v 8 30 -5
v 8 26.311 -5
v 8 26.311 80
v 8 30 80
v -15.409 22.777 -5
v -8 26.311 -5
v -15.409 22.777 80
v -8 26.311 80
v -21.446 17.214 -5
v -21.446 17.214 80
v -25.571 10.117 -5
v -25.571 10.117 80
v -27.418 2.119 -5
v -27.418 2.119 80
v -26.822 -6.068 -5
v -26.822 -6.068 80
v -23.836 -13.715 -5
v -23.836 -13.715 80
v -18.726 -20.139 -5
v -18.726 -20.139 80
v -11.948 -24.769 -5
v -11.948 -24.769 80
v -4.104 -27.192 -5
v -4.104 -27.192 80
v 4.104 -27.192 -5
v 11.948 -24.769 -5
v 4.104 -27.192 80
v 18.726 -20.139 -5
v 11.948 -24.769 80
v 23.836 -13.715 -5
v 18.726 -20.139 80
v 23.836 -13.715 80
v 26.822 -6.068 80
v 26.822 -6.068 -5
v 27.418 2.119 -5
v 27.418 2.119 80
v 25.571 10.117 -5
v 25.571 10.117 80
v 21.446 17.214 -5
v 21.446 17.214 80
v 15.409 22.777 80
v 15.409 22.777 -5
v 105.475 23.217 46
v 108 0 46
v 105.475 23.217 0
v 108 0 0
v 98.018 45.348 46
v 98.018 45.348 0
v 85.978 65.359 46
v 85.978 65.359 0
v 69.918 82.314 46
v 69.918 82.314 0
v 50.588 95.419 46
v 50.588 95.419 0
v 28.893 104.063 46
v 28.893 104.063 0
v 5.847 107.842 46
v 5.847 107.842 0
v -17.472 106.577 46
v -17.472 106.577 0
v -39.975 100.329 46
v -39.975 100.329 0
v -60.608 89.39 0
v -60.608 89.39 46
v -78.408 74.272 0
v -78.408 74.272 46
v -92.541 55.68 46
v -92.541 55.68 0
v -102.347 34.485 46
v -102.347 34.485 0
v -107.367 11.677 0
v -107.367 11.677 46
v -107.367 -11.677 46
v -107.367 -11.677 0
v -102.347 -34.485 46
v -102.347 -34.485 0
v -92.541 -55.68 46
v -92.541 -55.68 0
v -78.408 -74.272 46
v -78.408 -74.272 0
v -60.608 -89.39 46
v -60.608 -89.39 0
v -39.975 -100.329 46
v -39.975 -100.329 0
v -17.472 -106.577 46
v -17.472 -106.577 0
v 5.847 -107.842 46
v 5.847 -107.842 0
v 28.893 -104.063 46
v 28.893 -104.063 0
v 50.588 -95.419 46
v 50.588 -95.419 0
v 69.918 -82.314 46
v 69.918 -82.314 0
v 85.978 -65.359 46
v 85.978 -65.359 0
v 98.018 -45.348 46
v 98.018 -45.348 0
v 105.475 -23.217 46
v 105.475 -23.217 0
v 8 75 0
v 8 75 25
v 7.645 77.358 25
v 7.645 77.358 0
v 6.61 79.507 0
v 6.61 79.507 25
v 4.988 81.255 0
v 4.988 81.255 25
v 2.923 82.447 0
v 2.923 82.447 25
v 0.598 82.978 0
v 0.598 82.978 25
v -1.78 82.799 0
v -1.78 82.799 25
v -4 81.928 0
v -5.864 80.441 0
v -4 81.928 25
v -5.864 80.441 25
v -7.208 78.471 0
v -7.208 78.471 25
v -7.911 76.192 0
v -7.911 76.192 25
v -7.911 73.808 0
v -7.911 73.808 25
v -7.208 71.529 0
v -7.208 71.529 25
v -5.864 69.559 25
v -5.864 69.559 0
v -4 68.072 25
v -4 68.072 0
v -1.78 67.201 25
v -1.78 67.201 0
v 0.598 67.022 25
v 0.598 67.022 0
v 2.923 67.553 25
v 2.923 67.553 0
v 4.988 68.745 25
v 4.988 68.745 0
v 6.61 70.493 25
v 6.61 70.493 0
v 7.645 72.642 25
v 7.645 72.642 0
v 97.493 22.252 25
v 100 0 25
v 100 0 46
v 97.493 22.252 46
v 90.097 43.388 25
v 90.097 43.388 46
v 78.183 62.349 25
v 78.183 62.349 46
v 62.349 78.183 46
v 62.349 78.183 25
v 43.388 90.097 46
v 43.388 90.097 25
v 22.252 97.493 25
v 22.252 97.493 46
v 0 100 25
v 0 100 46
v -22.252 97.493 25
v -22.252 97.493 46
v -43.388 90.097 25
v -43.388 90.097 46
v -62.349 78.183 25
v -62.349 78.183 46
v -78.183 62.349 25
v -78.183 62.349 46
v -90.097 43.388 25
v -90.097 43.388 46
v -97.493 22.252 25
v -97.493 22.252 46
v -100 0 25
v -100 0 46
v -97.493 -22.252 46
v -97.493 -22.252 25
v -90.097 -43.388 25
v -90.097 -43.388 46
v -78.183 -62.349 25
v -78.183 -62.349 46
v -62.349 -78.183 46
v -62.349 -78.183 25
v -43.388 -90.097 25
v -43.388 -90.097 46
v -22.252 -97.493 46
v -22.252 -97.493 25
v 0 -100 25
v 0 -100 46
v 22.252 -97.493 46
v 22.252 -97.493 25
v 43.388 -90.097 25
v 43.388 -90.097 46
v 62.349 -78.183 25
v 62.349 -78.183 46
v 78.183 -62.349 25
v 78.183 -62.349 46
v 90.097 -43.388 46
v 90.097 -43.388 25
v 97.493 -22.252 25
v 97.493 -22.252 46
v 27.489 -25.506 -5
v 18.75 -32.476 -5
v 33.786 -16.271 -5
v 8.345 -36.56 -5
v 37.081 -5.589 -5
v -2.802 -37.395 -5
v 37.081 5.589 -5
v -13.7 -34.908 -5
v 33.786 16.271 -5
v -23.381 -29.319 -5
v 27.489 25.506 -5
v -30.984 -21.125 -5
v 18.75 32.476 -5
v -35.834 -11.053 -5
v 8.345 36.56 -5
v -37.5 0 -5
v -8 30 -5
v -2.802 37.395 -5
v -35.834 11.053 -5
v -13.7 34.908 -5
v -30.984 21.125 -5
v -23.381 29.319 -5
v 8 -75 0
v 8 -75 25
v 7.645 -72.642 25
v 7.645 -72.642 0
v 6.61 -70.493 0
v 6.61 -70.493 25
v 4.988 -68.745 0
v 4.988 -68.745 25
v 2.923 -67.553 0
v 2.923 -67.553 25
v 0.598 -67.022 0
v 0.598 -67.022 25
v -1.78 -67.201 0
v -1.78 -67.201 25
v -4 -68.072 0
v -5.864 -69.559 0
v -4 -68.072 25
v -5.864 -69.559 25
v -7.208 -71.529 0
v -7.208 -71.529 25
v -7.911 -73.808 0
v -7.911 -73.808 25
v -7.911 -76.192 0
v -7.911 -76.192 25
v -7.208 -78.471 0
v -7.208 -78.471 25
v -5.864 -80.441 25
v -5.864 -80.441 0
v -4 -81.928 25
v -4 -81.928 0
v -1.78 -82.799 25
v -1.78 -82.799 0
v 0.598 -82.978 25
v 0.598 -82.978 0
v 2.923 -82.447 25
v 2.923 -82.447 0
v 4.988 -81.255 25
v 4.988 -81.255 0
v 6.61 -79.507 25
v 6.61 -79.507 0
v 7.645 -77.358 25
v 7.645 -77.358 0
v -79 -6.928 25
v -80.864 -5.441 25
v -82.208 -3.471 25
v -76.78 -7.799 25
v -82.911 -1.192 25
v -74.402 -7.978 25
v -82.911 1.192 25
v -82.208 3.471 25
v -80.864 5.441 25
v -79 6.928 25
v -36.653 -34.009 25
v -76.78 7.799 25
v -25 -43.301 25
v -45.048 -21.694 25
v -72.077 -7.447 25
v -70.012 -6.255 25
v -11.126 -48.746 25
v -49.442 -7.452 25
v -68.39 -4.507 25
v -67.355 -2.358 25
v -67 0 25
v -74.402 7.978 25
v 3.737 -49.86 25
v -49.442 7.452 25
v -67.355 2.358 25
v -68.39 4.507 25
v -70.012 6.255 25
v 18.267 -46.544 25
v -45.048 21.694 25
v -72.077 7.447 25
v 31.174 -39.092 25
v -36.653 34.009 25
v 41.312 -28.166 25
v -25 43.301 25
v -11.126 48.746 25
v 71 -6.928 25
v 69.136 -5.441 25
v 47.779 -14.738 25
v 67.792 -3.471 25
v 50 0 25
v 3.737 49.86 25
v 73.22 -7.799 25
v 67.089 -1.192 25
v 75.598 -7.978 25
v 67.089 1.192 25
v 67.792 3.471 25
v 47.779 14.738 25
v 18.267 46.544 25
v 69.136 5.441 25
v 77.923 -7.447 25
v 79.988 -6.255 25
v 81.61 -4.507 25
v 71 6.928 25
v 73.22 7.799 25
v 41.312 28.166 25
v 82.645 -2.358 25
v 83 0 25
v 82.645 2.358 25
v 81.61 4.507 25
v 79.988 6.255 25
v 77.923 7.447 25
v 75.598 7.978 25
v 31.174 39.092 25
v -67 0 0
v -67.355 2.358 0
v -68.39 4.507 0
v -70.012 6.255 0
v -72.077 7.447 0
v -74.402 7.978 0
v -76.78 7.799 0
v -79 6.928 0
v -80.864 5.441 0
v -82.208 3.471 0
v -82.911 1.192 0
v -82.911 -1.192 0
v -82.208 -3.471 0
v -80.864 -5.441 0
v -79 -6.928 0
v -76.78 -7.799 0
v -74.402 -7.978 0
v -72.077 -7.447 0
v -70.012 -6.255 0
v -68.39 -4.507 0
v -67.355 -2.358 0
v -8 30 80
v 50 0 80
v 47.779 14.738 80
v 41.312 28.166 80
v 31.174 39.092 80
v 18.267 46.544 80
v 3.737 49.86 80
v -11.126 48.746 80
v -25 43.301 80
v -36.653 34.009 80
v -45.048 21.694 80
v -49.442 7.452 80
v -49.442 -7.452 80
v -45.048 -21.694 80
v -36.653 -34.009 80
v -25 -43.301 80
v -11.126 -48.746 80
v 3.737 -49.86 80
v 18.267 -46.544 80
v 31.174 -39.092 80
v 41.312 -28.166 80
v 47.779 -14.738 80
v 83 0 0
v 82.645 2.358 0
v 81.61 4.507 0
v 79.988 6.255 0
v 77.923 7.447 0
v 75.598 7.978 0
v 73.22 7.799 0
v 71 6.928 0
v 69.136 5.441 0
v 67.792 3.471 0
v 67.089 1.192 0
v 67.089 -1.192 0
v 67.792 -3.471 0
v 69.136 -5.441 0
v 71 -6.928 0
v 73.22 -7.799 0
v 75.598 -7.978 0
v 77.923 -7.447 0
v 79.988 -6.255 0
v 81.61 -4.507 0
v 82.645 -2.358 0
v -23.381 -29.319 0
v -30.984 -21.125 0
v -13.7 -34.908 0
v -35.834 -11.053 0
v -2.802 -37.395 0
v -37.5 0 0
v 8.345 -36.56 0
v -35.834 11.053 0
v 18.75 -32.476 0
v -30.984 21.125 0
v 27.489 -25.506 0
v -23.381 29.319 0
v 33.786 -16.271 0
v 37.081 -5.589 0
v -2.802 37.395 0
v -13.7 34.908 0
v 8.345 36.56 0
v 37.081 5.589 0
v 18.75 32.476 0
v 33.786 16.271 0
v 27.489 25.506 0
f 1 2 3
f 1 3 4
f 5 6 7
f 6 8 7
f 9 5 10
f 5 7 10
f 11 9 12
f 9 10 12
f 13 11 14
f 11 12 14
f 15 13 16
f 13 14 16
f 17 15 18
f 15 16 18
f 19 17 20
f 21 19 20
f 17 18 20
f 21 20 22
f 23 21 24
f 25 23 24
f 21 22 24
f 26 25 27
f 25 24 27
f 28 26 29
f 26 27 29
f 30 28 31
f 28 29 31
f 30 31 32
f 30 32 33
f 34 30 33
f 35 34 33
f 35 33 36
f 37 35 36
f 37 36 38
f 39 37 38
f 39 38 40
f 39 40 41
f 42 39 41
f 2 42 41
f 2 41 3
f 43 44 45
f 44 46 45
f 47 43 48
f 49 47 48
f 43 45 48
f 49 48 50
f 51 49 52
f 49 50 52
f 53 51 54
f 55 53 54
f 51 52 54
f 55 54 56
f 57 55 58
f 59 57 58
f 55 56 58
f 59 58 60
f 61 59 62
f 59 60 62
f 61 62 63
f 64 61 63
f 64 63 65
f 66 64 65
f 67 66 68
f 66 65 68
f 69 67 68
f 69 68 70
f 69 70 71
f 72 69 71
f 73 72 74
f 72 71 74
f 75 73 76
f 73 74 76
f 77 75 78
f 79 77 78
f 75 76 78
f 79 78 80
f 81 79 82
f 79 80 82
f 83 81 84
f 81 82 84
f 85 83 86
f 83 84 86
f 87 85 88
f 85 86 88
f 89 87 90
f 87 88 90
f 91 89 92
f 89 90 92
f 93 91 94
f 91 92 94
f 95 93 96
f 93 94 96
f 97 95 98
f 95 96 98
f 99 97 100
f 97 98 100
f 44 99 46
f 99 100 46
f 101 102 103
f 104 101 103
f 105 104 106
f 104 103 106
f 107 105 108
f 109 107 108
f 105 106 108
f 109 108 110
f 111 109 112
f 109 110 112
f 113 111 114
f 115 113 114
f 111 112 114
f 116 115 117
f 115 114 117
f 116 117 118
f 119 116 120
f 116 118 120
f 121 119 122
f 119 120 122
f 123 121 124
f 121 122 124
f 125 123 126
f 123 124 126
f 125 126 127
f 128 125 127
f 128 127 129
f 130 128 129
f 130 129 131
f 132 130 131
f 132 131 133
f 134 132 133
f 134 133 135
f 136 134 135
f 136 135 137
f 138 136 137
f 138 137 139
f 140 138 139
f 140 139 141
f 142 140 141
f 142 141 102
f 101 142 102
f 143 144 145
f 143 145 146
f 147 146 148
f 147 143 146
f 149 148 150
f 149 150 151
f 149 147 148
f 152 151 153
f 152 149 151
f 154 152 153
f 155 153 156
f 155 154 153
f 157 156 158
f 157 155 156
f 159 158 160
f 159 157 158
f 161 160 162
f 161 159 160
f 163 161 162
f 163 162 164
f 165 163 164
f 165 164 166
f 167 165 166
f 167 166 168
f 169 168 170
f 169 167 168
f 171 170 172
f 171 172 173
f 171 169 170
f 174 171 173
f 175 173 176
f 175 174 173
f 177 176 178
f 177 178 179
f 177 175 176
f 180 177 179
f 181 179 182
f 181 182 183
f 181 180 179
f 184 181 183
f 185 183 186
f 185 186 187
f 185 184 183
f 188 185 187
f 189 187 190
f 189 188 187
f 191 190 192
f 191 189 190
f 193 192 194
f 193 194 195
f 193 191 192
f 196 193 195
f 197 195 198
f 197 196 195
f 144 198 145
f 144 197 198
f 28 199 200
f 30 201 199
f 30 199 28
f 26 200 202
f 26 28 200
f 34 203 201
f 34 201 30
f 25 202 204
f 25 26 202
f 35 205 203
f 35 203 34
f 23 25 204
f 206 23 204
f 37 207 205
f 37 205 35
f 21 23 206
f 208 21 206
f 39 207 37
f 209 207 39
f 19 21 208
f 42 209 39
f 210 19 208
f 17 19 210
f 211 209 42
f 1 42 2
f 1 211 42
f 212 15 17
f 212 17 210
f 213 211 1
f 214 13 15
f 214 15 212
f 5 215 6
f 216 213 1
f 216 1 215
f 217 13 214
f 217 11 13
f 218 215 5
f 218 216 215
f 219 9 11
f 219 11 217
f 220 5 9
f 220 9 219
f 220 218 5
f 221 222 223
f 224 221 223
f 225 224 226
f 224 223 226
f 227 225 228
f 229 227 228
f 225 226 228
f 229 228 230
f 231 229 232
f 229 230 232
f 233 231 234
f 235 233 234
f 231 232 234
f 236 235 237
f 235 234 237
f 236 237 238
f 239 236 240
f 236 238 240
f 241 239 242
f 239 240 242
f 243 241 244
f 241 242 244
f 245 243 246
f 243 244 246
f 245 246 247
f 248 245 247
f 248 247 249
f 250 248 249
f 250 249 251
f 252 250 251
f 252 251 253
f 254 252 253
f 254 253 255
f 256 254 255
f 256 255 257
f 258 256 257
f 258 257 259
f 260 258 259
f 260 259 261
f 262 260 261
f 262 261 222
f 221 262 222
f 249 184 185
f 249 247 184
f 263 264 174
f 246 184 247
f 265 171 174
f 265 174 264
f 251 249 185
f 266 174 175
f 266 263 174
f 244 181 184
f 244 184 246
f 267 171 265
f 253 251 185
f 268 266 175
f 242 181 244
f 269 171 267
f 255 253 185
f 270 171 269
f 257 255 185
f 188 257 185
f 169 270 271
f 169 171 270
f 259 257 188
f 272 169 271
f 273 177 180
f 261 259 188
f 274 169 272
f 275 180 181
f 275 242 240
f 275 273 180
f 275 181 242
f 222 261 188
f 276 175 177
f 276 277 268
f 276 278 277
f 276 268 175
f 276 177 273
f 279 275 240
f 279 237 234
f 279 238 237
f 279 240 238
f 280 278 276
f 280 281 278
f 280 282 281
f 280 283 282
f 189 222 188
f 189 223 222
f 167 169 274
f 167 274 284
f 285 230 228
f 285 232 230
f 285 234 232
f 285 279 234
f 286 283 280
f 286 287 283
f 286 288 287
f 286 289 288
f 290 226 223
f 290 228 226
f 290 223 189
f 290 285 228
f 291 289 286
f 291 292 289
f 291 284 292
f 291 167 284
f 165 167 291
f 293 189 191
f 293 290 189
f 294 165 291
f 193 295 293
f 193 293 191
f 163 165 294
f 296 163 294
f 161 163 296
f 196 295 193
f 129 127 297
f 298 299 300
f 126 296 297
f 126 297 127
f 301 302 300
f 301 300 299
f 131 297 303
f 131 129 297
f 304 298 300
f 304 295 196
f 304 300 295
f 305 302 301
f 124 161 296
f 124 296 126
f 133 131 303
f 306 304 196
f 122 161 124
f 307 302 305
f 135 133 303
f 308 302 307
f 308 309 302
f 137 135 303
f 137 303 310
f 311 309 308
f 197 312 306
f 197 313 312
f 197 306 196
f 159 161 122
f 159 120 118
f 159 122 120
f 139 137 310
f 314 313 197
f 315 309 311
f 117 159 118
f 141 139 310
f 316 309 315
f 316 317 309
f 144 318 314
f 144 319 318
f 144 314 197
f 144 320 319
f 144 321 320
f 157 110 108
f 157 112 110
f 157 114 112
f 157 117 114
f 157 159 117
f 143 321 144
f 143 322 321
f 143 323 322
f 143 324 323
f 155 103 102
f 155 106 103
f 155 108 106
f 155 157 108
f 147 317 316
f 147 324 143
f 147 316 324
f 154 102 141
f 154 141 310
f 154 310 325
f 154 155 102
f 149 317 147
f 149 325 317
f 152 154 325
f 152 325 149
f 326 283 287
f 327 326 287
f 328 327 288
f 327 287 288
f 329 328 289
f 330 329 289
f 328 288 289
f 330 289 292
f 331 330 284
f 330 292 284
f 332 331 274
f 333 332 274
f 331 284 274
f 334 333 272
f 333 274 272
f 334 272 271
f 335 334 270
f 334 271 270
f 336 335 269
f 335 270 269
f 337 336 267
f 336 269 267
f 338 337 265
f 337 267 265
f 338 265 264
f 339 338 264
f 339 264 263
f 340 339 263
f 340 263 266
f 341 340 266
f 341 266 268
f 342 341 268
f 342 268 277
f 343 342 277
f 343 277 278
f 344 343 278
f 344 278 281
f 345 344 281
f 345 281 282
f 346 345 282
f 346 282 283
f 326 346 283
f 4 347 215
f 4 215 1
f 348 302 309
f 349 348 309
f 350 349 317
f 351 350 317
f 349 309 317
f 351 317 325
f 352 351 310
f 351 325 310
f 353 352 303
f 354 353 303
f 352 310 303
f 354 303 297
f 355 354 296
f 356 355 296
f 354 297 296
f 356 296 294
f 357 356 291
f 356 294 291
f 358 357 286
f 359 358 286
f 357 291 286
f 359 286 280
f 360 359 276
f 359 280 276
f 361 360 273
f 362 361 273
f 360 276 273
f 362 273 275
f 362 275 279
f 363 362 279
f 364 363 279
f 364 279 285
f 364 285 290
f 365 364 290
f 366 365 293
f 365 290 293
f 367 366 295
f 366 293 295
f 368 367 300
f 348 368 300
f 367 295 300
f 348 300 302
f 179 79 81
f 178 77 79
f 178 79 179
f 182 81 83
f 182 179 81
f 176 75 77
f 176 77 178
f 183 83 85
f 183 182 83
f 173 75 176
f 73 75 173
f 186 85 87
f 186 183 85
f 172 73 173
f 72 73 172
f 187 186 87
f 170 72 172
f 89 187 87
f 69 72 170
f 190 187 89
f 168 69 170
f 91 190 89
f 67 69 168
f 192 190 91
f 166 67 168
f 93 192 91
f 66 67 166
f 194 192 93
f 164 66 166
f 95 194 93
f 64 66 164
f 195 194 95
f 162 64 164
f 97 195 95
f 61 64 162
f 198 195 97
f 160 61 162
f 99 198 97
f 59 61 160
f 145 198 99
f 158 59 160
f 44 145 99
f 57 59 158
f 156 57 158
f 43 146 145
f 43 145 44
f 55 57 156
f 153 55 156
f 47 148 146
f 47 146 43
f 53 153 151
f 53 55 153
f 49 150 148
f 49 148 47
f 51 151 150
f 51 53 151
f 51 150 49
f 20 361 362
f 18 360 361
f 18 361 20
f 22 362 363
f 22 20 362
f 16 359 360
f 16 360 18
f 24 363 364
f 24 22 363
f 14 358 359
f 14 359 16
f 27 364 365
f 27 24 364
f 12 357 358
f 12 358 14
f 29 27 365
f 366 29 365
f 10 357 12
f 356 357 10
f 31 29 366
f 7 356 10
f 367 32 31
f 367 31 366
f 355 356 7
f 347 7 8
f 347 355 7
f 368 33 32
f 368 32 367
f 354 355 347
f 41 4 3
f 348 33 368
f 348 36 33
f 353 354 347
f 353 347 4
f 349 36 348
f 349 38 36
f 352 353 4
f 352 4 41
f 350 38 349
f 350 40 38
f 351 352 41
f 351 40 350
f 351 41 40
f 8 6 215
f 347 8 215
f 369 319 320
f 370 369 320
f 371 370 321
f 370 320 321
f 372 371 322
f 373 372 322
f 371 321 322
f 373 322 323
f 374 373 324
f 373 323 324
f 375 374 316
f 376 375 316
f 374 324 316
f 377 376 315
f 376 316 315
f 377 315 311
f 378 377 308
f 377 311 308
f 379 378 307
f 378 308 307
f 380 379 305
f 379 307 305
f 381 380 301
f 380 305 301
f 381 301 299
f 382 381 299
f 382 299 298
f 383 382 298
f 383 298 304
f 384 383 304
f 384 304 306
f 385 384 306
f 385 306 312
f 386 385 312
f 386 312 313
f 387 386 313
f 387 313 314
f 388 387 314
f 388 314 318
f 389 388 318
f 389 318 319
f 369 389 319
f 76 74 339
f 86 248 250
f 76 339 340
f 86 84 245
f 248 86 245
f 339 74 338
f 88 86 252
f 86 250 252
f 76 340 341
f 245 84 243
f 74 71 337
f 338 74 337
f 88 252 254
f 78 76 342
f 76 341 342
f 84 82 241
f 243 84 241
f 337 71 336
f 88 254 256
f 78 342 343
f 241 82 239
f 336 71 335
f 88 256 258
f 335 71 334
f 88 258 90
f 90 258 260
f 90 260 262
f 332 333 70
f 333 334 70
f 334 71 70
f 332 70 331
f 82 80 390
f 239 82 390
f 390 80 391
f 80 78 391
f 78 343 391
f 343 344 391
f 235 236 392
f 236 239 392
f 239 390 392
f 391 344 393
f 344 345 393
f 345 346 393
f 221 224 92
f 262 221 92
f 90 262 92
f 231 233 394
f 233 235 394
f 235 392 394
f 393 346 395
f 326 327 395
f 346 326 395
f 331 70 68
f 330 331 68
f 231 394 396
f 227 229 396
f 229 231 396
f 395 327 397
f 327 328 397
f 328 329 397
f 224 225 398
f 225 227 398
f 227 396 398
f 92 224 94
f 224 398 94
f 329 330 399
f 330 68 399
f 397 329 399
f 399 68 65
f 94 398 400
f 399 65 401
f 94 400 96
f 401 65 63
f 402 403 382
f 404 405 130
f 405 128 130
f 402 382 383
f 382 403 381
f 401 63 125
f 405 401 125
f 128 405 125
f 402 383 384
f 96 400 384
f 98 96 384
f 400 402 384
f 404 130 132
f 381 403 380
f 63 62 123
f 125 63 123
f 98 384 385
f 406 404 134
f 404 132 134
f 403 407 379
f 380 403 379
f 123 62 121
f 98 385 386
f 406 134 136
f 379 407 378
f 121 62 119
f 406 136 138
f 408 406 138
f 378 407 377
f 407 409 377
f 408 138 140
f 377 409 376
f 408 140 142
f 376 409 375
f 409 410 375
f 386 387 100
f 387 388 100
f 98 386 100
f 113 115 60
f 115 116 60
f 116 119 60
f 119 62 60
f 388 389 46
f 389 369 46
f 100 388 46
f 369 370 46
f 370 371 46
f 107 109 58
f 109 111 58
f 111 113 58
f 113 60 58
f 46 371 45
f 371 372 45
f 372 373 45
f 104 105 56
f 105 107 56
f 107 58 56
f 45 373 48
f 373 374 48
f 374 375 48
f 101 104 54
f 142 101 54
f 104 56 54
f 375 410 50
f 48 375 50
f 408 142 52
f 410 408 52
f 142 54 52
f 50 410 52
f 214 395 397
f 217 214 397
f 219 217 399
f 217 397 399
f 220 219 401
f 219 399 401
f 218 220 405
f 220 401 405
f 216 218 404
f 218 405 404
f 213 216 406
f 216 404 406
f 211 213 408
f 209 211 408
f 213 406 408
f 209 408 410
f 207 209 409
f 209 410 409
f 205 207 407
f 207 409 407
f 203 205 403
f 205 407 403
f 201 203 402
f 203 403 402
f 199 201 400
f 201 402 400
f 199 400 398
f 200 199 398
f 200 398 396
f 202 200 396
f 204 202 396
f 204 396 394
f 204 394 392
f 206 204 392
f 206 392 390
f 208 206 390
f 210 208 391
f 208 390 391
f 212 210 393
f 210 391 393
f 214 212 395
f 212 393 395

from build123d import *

# Parameters (mm, degrees)
SKETCH1_R           = 108
BOSS_EXTRUDE1_DEPTH = 25
SKETCH2_R           = 108
SKETCH2_R_2         = 100
BOSS_EXTRUDE2_DEPTH = 21
SKETCH3_R           = 50
SKETCH3_R_2         = 27.5
BOSS_EXTRUDE3_DEPTH = 55
SKETCH4_R           = 37.5
BOSS_EXTRUDE4_DEPTH = 5
SKETCH6_R           = 27.5
CUT_EXTRUDE1_DEPTH  = 31
SKETCH7_R           = 8
CUT_EXTRUDE2_DEPTH  = 31
SKETCH9_W           = 16
SKETCH9_H           = 30
CUT_EXTRUDE4_DEPTH  = 86


with BuildPart() as part:
    # Sketch1 → Boss-Extrude1 (new body)
    with BuildSketch(Plane.XY):
        Circle(SKETCH1_R)
    extrude(amount=BOSS_EXTRUDE1_DEPTH)

    # Sketch2 → Boss-Extrude2 (add)
    with BuildSketch(Plane.XY.offset(25)):
        Circle(SKETCH2_R)
        Circle(SKETCH2_R_2, mode=Mode.SUBTRACT)
    extrude(amount=BOSS_EXTRUDE2_DEPTH)

    # Sketch3 → Boss-Extrude3 (add)
    with BuildSketch(Plane.XY.offset(25)):
        Circle(SKETCH3_R)
        Circle(SKETCH3_R_2, mode=Mode.SUBTRACT)
    extrude(amount=BOSS_EXTRUDE3_DEPTH)

    # Sketch4 → Boss-Extrude4 (add)
    with BuildSketch(Plane(origin=(0, 0, 0), x_dir=(-1, 0, 0), z_dir=(0, 0, -1))):
        Circle(SKETCH4_R)
    extrude(amount=BOSS_EXTRUDE4_DEPTH)

    # Sketch6 → Cut-Extrude1 (cut, through all)
    with BuildSketch(Plane.XY.offset(25)):
        Circle(SKETCH6_R)
    extrude(amount=-CUT_EXTRUDE1_DEPTH, mode=Mode.SUBTRACT)

    # Sketch7 → Cut-Extrude2 (cut, through all)
    with BuildSketch(Plane.XY.offset(25)):
        with Locations((0, 75)):
            Circle(SKETCH7_R)
        with Locations((75, 0)):
            Circle(SKETCH7_R)
        with Locations((0, -75)):
            Circle(SKETCH7_R)
        with Locations((-75, 0)):
            Circle(SKETCH7_R)
    extrude(amount=-CUT_EXTRUDE2_DEPTH, mode=Mode.SUBTRACT)

    # Sketch9 → Cut-Extrude4 (cut, through all)
    with BuildSketch(Plane.XY.offset(80)):
        with Locations((0, 15)):
            Rectangle(SKETCH9_W, SKETCH9_H)
    extrude(amount=-CUT_EXTRUDE4_DEPTH, mode=Mode.SUBTRACT)


solid = part.part
